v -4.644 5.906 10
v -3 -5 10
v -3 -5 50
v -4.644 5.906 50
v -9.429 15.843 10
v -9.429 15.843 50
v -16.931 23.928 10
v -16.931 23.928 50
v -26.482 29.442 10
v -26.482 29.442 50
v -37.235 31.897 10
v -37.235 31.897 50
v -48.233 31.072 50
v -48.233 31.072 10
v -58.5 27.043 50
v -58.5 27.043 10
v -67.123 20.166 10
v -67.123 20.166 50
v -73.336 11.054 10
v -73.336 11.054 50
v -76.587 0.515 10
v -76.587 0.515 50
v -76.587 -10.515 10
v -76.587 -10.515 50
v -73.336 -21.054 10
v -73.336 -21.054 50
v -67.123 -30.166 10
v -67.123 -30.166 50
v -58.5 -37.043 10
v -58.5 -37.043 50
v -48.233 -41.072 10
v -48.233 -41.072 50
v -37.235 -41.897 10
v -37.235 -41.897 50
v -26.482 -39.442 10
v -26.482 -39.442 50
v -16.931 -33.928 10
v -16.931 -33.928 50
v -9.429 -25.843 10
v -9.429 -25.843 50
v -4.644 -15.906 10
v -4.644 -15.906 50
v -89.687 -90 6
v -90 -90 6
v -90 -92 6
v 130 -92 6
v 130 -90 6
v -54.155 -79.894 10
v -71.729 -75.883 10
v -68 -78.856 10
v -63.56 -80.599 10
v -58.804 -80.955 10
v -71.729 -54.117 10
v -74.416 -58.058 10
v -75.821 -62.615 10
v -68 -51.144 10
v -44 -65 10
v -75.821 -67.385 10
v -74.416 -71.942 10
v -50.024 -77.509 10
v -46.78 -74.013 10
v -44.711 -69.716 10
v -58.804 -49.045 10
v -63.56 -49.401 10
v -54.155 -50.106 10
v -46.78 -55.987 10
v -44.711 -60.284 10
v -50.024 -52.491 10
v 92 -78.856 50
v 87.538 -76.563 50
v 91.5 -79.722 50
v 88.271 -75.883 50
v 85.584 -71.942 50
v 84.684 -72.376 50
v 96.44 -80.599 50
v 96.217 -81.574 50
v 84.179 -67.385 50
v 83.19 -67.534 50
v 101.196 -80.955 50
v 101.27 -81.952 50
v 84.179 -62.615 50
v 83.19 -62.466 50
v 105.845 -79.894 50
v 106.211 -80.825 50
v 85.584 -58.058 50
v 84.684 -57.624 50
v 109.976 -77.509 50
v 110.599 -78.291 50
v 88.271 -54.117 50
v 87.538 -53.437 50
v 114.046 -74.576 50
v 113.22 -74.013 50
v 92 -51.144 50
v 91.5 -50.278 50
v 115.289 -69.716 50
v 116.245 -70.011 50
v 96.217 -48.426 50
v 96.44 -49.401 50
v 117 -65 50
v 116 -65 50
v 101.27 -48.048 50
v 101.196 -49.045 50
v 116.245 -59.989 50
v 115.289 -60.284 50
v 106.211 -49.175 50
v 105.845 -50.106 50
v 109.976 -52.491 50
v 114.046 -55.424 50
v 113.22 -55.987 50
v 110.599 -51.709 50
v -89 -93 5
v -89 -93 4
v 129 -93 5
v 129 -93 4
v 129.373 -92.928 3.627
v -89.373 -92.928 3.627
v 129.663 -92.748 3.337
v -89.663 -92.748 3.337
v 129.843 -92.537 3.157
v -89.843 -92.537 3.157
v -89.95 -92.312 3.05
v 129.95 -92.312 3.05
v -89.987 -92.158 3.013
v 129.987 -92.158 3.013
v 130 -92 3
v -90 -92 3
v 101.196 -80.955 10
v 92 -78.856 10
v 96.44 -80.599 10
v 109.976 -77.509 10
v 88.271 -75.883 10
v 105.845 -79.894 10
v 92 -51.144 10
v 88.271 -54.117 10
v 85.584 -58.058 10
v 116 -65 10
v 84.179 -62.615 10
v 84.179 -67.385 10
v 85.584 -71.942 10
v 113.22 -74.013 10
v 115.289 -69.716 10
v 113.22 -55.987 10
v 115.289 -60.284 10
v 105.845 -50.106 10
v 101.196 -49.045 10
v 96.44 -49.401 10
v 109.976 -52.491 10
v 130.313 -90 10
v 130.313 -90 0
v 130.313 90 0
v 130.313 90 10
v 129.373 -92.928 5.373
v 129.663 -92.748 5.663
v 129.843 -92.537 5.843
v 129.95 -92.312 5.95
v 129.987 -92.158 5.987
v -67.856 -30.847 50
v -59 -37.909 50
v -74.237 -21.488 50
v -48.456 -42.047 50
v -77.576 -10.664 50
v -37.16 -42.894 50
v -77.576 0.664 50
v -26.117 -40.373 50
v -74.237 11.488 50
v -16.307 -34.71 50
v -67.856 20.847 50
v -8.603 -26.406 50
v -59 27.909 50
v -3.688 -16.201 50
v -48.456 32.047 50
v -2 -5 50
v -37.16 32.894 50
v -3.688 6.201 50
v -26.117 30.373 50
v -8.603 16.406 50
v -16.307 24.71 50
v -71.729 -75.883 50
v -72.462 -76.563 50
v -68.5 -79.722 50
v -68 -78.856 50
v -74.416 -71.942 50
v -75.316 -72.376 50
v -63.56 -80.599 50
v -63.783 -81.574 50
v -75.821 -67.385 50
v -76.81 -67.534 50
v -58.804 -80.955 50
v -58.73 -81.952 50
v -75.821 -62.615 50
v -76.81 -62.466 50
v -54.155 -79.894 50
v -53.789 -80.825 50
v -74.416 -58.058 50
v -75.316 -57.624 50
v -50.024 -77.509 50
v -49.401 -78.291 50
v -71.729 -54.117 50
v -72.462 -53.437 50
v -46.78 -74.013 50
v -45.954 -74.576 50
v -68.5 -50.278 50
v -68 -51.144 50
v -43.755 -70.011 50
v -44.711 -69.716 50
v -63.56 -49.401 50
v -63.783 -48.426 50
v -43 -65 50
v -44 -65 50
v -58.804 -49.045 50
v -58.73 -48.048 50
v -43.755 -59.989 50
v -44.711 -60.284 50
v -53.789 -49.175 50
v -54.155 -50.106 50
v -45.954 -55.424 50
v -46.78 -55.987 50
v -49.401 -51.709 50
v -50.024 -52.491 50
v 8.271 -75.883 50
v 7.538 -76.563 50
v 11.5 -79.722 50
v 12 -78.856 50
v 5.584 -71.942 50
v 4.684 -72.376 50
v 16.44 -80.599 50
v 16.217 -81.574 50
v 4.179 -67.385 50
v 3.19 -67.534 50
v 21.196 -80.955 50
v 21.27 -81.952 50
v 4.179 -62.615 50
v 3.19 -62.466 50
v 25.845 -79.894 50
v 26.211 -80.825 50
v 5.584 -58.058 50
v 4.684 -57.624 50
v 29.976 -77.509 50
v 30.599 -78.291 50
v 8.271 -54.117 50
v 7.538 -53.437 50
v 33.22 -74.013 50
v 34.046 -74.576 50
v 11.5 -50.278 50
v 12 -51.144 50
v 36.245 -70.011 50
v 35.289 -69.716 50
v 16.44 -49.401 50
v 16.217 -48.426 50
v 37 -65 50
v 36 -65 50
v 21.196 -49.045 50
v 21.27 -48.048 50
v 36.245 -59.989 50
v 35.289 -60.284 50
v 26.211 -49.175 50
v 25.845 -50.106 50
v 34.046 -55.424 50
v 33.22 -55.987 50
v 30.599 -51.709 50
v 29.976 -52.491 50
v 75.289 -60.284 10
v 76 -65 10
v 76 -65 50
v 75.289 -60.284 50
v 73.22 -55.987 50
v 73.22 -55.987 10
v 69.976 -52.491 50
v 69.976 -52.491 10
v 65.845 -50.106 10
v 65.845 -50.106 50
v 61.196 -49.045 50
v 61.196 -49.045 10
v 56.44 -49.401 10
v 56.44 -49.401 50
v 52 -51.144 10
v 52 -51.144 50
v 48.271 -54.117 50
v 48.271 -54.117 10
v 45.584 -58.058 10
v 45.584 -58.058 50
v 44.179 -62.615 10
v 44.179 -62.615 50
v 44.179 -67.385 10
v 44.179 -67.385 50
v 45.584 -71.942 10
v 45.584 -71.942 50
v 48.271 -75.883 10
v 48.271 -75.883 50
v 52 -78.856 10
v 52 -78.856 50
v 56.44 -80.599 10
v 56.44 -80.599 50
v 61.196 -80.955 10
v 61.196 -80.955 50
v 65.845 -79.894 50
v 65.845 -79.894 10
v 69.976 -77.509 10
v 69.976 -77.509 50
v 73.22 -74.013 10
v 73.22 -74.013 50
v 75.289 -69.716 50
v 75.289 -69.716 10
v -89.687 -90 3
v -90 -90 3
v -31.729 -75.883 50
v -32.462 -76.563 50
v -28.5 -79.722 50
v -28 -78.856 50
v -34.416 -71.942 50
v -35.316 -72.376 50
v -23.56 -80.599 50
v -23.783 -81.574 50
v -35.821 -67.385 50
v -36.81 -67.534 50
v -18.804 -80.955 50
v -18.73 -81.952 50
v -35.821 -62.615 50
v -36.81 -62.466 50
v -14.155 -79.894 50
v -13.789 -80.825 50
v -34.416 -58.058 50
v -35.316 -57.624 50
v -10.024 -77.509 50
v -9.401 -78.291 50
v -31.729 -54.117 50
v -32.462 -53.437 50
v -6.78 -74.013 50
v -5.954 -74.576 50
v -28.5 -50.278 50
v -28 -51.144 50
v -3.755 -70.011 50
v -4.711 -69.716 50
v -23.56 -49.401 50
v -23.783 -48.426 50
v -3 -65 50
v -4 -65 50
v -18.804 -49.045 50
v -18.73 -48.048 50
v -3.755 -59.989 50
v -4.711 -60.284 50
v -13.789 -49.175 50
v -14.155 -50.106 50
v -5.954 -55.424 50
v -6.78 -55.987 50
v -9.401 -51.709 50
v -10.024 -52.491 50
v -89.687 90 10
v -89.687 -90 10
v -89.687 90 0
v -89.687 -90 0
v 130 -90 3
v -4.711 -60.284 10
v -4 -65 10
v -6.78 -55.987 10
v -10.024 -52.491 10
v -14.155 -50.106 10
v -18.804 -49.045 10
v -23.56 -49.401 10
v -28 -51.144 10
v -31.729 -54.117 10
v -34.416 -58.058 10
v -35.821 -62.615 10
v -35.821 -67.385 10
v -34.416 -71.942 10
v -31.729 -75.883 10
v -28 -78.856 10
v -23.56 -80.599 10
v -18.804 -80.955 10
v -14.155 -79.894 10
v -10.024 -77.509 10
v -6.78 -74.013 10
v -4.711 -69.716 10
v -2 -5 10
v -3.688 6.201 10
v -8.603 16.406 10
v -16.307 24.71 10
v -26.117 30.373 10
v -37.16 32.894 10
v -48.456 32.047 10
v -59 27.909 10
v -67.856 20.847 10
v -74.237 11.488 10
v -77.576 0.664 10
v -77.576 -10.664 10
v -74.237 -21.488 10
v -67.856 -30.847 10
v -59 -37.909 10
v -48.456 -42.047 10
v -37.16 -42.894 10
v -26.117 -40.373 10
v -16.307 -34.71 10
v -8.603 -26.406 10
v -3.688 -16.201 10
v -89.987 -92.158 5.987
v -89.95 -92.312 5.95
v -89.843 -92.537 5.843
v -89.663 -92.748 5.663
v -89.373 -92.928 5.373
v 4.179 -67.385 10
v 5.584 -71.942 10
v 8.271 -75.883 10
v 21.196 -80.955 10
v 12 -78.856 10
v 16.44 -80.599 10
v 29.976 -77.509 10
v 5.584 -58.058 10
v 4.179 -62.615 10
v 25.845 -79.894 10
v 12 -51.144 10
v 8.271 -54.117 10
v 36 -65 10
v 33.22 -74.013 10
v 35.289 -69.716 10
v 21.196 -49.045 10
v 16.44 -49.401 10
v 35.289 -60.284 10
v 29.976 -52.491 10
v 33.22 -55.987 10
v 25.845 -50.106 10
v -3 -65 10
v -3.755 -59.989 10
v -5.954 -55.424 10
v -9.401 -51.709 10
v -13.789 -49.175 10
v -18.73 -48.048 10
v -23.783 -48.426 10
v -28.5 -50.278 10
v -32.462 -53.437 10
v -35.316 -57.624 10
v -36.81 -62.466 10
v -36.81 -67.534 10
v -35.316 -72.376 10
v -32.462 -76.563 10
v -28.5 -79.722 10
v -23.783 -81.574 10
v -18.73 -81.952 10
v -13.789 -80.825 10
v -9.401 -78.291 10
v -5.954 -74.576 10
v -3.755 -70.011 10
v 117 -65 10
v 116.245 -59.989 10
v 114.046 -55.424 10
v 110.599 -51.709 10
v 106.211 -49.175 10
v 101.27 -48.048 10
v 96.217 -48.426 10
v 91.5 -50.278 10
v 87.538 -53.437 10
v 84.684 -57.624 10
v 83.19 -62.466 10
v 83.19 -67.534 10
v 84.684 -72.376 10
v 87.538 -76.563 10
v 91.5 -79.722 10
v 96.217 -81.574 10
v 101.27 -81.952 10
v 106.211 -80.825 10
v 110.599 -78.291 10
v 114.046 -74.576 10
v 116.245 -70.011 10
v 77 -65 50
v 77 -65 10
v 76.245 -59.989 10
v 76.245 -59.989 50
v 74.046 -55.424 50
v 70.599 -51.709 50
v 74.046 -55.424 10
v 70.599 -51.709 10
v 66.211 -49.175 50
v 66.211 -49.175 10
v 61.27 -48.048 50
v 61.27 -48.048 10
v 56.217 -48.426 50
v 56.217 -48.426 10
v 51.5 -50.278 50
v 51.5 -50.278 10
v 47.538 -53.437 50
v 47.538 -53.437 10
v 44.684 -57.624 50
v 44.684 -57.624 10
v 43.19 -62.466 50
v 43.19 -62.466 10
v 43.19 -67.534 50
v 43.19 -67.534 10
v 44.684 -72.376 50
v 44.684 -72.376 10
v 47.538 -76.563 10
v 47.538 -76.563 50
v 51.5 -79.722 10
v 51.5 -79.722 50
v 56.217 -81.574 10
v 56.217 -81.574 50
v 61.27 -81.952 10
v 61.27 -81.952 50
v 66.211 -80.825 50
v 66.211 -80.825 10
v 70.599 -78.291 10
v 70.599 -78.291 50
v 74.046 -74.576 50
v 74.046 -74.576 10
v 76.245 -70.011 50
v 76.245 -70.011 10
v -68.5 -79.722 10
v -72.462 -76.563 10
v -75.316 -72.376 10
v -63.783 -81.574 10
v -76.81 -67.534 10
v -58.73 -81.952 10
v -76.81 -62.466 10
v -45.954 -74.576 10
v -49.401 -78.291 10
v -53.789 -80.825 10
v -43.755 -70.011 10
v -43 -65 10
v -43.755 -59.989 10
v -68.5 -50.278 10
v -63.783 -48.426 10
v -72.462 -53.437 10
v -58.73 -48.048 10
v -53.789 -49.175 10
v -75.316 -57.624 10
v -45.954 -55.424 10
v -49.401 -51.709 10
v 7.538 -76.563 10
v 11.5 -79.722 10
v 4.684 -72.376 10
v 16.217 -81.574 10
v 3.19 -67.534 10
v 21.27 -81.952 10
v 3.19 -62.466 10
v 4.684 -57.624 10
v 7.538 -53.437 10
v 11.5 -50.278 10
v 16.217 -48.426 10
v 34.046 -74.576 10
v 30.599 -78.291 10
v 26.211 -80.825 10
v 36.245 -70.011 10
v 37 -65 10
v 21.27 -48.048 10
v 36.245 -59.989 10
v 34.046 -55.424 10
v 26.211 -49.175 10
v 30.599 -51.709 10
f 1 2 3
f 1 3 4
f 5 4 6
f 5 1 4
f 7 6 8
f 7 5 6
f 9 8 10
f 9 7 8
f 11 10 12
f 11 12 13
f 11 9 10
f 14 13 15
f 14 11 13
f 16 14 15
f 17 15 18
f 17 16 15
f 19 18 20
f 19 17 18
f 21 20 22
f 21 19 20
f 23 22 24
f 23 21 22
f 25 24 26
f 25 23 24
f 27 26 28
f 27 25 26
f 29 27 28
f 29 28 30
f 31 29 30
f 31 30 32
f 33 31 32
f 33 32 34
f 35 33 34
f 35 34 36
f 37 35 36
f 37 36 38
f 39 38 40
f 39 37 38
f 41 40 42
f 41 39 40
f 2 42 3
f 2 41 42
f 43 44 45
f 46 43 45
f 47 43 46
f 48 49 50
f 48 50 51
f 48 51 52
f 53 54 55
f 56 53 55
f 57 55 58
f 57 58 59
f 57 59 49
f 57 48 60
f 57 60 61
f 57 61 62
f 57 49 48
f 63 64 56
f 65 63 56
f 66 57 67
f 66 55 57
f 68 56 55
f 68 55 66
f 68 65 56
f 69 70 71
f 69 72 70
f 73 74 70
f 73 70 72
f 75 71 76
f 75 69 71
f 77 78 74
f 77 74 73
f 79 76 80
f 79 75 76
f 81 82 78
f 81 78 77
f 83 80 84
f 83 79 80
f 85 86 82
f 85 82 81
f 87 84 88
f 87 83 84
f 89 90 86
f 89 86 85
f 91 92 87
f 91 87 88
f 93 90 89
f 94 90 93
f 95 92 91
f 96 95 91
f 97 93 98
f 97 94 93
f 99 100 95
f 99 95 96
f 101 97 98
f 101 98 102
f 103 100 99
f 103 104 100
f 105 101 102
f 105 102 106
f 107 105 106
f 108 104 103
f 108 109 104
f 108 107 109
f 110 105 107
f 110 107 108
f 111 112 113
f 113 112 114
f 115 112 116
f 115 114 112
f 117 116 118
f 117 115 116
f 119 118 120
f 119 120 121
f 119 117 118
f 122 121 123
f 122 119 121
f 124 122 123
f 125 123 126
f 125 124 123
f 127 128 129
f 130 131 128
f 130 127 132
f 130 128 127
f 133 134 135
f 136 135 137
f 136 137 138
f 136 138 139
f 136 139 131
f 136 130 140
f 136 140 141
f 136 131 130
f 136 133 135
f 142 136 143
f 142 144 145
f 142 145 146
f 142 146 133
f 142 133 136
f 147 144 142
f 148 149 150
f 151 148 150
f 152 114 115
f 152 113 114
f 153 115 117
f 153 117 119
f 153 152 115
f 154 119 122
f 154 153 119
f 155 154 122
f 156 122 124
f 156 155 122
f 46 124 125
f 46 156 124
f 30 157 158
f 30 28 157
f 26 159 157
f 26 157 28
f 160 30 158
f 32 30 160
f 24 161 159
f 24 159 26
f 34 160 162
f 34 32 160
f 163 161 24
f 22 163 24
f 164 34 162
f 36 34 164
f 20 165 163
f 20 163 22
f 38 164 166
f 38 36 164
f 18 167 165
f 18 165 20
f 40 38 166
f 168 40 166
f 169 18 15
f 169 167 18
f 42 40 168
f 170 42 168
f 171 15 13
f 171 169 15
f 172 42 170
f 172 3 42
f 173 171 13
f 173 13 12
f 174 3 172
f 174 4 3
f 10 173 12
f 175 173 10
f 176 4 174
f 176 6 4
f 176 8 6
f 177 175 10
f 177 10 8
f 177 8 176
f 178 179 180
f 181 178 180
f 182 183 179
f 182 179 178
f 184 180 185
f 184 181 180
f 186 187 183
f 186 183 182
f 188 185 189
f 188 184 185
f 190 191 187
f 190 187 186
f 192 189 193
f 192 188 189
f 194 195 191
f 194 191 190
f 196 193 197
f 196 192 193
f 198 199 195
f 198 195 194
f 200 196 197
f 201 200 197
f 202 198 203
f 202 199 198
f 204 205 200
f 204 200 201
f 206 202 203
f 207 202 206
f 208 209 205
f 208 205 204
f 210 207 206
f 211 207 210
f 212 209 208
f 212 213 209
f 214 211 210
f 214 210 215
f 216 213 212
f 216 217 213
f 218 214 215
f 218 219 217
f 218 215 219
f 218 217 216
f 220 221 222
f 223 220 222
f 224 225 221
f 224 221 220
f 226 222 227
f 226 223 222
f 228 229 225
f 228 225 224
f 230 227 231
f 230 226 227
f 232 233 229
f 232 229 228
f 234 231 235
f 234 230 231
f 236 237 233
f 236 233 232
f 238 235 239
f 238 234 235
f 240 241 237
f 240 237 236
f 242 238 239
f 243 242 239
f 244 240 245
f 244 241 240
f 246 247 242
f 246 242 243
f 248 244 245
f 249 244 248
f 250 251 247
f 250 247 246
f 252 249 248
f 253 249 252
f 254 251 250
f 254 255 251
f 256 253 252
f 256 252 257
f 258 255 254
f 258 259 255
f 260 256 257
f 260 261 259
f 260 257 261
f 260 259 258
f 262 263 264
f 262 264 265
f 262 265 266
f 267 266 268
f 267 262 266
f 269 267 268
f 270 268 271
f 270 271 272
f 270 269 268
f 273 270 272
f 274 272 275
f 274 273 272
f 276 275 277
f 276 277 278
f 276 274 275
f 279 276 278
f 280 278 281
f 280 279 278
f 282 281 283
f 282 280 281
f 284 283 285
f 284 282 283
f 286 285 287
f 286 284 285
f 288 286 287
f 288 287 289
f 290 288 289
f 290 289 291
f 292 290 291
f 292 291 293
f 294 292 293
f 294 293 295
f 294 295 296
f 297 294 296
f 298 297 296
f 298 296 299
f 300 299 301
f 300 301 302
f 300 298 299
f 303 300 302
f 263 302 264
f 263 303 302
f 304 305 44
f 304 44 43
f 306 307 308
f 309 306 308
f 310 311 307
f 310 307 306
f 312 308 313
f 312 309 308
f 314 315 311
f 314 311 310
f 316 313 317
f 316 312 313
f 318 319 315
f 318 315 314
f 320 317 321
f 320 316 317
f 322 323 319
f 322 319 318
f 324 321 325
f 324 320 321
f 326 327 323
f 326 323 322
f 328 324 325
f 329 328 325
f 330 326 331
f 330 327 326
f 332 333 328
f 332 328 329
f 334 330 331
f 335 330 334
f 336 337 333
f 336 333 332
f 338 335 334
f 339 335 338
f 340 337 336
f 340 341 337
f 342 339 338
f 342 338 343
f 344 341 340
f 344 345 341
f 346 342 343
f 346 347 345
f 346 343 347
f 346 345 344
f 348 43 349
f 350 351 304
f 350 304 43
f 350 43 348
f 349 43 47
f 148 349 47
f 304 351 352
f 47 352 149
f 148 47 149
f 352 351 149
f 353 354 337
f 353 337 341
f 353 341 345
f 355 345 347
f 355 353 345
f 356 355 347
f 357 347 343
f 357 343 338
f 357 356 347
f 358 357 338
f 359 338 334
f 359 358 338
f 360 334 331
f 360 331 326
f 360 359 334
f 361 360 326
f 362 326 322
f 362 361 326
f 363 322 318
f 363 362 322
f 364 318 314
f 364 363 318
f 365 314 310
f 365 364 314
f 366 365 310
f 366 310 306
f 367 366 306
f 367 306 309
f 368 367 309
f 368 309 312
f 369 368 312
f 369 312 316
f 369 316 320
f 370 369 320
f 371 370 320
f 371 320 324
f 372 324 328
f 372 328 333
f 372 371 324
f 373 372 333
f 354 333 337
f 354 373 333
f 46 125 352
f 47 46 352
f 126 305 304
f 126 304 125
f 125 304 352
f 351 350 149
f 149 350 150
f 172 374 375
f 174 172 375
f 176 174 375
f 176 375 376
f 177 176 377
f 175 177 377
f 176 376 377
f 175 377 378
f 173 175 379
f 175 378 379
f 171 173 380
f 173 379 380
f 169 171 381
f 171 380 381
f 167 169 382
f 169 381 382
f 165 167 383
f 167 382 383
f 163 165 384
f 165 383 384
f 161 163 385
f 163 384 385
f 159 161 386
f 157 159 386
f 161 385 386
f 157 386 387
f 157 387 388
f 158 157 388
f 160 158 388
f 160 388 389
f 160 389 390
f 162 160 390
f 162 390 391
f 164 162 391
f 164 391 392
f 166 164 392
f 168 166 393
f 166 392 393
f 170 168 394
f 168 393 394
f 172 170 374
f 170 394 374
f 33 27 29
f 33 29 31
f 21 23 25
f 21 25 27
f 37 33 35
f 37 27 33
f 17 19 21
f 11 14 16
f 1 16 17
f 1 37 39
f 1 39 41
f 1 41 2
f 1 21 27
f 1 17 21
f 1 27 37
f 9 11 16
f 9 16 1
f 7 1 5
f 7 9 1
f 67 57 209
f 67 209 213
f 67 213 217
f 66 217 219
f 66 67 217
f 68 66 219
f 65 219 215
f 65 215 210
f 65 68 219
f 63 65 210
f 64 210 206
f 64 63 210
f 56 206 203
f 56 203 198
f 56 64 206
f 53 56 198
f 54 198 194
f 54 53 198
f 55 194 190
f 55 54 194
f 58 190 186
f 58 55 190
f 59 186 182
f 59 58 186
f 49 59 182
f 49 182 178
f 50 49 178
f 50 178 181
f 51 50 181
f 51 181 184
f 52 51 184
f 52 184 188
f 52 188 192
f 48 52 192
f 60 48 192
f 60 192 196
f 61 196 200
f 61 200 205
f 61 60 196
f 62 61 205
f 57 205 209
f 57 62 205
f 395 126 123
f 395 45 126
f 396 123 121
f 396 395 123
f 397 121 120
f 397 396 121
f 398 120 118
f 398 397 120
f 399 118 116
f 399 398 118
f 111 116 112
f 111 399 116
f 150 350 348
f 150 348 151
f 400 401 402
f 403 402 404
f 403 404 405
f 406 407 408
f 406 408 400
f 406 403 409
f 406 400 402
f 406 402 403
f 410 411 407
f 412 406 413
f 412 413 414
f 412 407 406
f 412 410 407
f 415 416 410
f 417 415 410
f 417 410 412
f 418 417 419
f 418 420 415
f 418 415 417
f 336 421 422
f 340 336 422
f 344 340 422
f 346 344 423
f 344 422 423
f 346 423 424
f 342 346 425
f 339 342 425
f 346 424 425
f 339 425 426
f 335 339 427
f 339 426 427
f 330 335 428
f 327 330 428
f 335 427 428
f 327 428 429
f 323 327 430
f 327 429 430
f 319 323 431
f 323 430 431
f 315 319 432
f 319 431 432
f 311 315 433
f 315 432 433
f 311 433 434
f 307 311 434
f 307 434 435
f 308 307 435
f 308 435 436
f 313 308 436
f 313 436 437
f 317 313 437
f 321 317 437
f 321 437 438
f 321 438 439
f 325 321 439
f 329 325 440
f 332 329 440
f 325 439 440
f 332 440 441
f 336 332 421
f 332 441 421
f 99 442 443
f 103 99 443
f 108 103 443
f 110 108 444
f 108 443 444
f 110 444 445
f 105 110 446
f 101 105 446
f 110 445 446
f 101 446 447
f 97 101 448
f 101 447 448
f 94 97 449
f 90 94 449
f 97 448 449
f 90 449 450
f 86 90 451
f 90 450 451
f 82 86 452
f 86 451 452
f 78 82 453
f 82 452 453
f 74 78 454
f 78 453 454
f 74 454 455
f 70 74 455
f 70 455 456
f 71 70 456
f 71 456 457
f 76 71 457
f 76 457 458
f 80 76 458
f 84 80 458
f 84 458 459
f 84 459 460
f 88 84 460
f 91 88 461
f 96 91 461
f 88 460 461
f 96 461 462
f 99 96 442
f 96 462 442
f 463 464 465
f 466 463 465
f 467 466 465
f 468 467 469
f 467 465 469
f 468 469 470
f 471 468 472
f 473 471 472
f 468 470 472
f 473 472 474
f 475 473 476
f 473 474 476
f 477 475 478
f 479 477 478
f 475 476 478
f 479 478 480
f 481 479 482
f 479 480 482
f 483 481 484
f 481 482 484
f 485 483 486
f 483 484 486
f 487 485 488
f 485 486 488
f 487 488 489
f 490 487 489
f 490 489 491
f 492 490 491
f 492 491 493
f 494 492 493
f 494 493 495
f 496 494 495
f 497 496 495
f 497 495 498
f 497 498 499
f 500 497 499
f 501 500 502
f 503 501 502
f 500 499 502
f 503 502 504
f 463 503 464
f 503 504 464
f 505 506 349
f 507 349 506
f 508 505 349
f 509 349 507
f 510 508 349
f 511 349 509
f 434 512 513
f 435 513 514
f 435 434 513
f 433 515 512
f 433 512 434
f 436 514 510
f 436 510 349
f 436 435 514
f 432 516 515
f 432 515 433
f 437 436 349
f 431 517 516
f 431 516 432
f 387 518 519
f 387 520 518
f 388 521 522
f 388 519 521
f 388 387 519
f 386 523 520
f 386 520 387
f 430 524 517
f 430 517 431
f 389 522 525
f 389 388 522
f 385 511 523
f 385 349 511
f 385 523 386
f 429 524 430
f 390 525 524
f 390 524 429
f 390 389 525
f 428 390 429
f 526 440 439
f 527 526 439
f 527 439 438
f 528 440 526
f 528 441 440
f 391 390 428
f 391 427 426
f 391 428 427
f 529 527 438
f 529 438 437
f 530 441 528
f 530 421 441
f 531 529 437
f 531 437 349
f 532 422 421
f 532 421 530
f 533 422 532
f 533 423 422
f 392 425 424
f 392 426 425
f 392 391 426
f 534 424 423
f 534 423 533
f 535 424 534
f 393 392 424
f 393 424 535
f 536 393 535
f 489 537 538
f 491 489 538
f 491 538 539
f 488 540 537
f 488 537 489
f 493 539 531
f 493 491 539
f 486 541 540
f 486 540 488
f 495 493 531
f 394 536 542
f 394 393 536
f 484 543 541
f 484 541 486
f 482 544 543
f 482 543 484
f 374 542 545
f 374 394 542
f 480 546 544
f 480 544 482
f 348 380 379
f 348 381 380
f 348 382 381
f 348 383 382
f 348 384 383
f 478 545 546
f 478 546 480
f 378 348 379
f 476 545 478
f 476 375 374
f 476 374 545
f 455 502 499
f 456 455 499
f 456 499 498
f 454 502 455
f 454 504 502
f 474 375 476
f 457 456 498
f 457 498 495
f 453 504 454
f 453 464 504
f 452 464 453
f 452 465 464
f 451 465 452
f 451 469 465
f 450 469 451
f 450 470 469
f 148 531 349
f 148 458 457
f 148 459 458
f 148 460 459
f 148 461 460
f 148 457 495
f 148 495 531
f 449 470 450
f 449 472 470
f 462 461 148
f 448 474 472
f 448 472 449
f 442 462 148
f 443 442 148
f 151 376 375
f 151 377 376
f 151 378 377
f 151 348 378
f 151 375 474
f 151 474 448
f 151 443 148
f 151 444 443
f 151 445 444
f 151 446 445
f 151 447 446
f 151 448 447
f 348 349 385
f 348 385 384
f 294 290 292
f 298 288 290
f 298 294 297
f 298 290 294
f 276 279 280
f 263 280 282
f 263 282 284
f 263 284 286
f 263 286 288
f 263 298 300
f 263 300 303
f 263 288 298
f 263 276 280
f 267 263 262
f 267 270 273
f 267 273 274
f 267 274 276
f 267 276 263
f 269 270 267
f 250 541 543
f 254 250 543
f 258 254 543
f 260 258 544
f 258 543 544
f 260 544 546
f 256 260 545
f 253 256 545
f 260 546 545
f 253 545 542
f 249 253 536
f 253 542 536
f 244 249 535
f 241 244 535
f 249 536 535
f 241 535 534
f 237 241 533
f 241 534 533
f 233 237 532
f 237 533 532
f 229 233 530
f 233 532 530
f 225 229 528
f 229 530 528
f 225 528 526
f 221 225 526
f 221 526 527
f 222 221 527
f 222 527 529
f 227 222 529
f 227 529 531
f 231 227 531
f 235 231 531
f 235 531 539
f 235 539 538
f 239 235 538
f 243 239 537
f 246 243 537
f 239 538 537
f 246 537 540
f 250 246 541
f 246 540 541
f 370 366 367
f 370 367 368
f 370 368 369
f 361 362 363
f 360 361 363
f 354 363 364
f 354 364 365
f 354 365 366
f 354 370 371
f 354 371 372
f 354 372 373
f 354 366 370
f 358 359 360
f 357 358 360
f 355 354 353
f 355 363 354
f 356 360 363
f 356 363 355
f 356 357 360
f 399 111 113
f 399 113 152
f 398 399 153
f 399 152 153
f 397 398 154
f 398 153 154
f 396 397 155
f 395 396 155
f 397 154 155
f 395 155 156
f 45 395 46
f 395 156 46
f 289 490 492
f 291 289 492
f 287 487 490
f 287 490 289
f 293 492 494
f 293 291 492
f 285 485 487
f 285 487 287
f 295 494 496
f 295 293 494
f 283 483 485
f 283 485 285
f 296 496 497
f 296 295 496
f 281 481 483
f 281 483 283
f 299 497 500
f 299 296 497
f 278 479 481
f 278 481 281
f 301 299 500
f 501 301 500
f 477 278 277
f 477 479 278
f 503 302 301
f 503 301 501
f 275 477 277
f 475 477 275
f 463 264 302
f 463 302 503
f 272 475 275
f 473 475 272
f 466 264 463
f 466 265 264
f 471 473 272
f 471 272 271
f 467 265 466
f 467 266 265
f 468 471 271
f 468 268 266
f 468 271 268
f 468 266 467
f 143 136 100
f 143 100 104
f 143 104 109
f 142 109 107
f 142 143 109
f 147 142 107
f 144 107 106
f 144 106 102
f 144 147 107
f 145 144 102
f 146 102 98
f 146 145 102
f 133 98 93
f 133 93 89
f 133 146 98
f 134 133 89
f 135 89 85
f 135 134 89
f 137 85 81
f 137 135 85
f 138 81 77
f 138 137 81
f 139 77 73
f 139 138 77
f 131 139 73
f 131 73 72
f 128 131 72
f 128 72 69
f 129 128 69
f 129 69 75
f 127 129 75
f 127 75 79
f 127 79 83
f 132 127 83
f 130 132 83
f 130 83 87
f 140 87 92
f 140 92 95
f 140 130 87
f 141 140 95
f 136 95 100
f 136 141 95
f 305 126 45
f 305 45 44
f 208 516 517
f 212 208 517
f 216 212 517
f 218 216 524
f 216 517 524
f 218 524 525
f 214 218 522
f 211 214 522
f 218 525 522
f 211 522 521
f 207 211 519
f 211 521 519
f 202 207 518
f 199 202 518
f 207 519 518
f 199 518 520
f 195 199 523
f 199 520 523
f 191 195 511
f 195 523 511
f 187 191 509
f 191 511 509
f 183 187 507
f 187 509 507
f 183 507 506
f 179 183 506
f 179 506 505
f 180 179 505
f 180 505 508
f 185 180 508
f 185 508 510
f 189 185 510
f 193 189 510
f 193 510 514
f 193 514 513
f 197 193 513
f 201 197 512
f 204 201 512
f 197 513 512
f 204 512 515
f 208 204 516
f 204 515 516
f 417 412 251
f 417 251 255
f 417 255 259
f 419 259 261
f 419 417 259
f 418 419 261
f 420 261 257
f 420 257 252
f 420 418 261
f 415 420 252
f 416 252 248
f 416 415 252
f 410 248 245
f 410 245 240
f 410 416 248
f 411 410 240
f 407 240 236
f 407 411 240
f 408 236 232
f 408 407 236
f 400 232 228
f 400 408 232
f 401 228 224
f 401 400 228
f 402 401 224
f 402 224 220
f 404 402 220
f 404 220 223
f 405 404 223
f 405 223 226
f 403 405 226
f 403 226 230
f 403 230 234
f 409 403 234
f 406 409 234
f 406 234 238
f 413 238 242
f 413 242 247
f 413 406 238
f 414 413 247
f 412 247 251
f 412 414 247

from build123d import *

# Parameters (mm, degrees)
SKETCH_W          = 220
SKETCH_H          = 180
PAD_DEPTH         = 10
BOX_W             = 220
BOX_H             = 3
BOX_DEPTH         = 3
FILLET_R          = 1
CYLINDER_R        = 17
CYLINDER_DEPTH    = 40
CYLINDER001_R     = 16
CYLINDER001_DEPTH = 40
CYLINDER002_R     = 17
CYLINDER002_DEPTH = 40
CYLINDER003_R     = 17
CYLINDER003_DEPTH = 40
CYLINDER004_R     = 17
CYLINDER004_DEPTH = 40
CYLINDER005_R     = 17
CYLINDER005_DEPTH = 40
CYLINDER006_R     = 16
CYLINDER006_DEPTH = 40
CYLINDER007_R     = 16
CYLINDER007_DEPTH = 40
CYLINDER008_R     = 16
CYLINDER008_DEPTH = 40
CYLINDER009_R     = 16
CYLINDER009_DEPTH = 40
CYLINDER012_R     = 38
CYLINDER012_DEPTH = 40
CYLINDER013_R     = 37
CYLINDER013_DEPTH = 40


with BuildPart() as part:
    # Sketch → Pad (new body)
    with BuildSketch(Plane.XY):
        with Locations((20.312759, 0)):
            Rectangle(SKETCH_W, SKETCH_H)
    extrude(amount=PAD_DEPTH)

    # Box → Box (join)
    with BuildSketch(Plane(origin=(-90, -93, 3), x_dir=(1, 0, 0), z_dir=(0, 0, 1))):
        with Locations((110, 1.5)):
            Rectangle(BOX_W, BOX_H)
    extrude(amount=BOX_DEPTH)

    # Fillet
    fillet_edges = [part.edges().sort_by_distance(p)[0] for p in [
        (20, -93, 3),
        (130, -93, 4.5),
        (20, -93, 6),
        (-90, -93, 4.5),
    ]]
    fillet(fillet_edges, radius=FILLET_R)

    # Cylinder → Cylinder (join)
    with BuildSketch(Plane(origin=(-60, -65, 10), x_dir=(1, 0, 0), z_dir=(0, 0, 1))):
        Circle(CYLINDER_R)
    extrude(amount=CYLINDER_DEPTH)

    # Cylinder001 → Cylinder001 (cut)
    with BuildSketch(Plane(origin=(-60, -65, 10), x_dir=(1, 0, 0), z_dir=(0, 0, 1))):
        Circle(CYLINDER001_R)
    extrude(amount=CYLINDER001_DEPTH, mode=Mode.SUBTRACT)

    # Cylinder002 → Cylinder002 (join)
    with BuildSketch(Plane(origin=(-20, -65, 10), x_dir=(1, 0, 0), z_dir=(0, 0, 1))):
        Circle(CYLINDER002_R)
    extrude(amount=CYLINDER002_DEPTH)

    # Cylinder003 → Cylinder003 (join)
    with BuildSketch(Plane(origin=(20, -65, 10), x_dir=(1, 0, 0), z_dir=(0, 0, 1))):
        Circle(CYLINDER003_R)
    extrude(amount=CYLINDER003_DEPTH)

    # Cylinder004 → Cylinder004 (join)
    with BuildSketch(Plane(origin=(60, -65, 10), x_dir=(1, 0, 0), z_dir=(0, 0, 1))):
        Circle(CYLINDER004_R)
    extrude(amount=CYLINDER004_DEPTH)

    # Cylinder005 → Cylinder005 (join)
    with BuildSketch(Plane(origin=(100, -65, 10), x_dir=(1, 0, 0), z_dir=(0, 0, 1))):
        Circle(CYLINDER005_R)
    extrude(amount=CYLINDER005_DEPTH)

    # Cylinder006 → Cylinder006 (cut)
    with BuildSketch(Plane(origin=(-20, -65, 10), x_dir=(1, 0, 0), z_dir=(0, 0, 1))):
        Circle(CYLINDER006_R)
    extrude(amount=CYLINDER006_DEPTH, mode=Mode.SUBTRACT)

    # Cylinder007 → Cylinder007 (cut)
    with BuildSketch(Plane(origin=(20, -65, 10), x_dir=(1, 0, 0), z_dir=(0, 0, 1))):
        Circle(CYLINDER007_R)
    extrude(amount=CYLINDER007_DEPTH, mode=Mode.SUBTRACT)

    # Cylinder008 → Cylinder008 (cut)
    with BuildSketch(Plane(origin=(60, -65, 10), x_dir=(1, 0, 0), z_dir=(0, 0, 1))):
        Circle(CYLINDER008_R)
    extrude(amount=CYLINDER008_DEPTH, mode=Mode.SUBTRACT)

    # Cylinder009 → Cylinder009 (cut)
    with BuildSketch(Plane(origin=(100, -65, 10), x_dir=(1, 0, 0), z_dir=(0, 0, 1))):
        Circle(CYLINDER009_R)
    extrude(amount=CYLINDER009_DEPTH, mode=Mode.SUBTRACT)

    # Cylinder012 → Cylinder012 (join)
    with BuildSketch(Plane(origin=(-40, -5, 10), x_dir=(1, 0, 0), z_dir=(0, 0, 1))):
        Circle(CYLINDER012_R)
    extrude(amount=CYLINDER012_DEPTH)

    # Cylinder013 → Cylinder013 (cut)
    with BuildSketch(Plane(origin=(-40, -5, 10), x_dir=(1, 0, 0), z_dir=(0, 0, 1))):
        Circle(CYLINDER013_R)
    extrude(amount=CYLINDER013_DEPTH, mode=Mode.SUBTRACT)


solid = part.part
